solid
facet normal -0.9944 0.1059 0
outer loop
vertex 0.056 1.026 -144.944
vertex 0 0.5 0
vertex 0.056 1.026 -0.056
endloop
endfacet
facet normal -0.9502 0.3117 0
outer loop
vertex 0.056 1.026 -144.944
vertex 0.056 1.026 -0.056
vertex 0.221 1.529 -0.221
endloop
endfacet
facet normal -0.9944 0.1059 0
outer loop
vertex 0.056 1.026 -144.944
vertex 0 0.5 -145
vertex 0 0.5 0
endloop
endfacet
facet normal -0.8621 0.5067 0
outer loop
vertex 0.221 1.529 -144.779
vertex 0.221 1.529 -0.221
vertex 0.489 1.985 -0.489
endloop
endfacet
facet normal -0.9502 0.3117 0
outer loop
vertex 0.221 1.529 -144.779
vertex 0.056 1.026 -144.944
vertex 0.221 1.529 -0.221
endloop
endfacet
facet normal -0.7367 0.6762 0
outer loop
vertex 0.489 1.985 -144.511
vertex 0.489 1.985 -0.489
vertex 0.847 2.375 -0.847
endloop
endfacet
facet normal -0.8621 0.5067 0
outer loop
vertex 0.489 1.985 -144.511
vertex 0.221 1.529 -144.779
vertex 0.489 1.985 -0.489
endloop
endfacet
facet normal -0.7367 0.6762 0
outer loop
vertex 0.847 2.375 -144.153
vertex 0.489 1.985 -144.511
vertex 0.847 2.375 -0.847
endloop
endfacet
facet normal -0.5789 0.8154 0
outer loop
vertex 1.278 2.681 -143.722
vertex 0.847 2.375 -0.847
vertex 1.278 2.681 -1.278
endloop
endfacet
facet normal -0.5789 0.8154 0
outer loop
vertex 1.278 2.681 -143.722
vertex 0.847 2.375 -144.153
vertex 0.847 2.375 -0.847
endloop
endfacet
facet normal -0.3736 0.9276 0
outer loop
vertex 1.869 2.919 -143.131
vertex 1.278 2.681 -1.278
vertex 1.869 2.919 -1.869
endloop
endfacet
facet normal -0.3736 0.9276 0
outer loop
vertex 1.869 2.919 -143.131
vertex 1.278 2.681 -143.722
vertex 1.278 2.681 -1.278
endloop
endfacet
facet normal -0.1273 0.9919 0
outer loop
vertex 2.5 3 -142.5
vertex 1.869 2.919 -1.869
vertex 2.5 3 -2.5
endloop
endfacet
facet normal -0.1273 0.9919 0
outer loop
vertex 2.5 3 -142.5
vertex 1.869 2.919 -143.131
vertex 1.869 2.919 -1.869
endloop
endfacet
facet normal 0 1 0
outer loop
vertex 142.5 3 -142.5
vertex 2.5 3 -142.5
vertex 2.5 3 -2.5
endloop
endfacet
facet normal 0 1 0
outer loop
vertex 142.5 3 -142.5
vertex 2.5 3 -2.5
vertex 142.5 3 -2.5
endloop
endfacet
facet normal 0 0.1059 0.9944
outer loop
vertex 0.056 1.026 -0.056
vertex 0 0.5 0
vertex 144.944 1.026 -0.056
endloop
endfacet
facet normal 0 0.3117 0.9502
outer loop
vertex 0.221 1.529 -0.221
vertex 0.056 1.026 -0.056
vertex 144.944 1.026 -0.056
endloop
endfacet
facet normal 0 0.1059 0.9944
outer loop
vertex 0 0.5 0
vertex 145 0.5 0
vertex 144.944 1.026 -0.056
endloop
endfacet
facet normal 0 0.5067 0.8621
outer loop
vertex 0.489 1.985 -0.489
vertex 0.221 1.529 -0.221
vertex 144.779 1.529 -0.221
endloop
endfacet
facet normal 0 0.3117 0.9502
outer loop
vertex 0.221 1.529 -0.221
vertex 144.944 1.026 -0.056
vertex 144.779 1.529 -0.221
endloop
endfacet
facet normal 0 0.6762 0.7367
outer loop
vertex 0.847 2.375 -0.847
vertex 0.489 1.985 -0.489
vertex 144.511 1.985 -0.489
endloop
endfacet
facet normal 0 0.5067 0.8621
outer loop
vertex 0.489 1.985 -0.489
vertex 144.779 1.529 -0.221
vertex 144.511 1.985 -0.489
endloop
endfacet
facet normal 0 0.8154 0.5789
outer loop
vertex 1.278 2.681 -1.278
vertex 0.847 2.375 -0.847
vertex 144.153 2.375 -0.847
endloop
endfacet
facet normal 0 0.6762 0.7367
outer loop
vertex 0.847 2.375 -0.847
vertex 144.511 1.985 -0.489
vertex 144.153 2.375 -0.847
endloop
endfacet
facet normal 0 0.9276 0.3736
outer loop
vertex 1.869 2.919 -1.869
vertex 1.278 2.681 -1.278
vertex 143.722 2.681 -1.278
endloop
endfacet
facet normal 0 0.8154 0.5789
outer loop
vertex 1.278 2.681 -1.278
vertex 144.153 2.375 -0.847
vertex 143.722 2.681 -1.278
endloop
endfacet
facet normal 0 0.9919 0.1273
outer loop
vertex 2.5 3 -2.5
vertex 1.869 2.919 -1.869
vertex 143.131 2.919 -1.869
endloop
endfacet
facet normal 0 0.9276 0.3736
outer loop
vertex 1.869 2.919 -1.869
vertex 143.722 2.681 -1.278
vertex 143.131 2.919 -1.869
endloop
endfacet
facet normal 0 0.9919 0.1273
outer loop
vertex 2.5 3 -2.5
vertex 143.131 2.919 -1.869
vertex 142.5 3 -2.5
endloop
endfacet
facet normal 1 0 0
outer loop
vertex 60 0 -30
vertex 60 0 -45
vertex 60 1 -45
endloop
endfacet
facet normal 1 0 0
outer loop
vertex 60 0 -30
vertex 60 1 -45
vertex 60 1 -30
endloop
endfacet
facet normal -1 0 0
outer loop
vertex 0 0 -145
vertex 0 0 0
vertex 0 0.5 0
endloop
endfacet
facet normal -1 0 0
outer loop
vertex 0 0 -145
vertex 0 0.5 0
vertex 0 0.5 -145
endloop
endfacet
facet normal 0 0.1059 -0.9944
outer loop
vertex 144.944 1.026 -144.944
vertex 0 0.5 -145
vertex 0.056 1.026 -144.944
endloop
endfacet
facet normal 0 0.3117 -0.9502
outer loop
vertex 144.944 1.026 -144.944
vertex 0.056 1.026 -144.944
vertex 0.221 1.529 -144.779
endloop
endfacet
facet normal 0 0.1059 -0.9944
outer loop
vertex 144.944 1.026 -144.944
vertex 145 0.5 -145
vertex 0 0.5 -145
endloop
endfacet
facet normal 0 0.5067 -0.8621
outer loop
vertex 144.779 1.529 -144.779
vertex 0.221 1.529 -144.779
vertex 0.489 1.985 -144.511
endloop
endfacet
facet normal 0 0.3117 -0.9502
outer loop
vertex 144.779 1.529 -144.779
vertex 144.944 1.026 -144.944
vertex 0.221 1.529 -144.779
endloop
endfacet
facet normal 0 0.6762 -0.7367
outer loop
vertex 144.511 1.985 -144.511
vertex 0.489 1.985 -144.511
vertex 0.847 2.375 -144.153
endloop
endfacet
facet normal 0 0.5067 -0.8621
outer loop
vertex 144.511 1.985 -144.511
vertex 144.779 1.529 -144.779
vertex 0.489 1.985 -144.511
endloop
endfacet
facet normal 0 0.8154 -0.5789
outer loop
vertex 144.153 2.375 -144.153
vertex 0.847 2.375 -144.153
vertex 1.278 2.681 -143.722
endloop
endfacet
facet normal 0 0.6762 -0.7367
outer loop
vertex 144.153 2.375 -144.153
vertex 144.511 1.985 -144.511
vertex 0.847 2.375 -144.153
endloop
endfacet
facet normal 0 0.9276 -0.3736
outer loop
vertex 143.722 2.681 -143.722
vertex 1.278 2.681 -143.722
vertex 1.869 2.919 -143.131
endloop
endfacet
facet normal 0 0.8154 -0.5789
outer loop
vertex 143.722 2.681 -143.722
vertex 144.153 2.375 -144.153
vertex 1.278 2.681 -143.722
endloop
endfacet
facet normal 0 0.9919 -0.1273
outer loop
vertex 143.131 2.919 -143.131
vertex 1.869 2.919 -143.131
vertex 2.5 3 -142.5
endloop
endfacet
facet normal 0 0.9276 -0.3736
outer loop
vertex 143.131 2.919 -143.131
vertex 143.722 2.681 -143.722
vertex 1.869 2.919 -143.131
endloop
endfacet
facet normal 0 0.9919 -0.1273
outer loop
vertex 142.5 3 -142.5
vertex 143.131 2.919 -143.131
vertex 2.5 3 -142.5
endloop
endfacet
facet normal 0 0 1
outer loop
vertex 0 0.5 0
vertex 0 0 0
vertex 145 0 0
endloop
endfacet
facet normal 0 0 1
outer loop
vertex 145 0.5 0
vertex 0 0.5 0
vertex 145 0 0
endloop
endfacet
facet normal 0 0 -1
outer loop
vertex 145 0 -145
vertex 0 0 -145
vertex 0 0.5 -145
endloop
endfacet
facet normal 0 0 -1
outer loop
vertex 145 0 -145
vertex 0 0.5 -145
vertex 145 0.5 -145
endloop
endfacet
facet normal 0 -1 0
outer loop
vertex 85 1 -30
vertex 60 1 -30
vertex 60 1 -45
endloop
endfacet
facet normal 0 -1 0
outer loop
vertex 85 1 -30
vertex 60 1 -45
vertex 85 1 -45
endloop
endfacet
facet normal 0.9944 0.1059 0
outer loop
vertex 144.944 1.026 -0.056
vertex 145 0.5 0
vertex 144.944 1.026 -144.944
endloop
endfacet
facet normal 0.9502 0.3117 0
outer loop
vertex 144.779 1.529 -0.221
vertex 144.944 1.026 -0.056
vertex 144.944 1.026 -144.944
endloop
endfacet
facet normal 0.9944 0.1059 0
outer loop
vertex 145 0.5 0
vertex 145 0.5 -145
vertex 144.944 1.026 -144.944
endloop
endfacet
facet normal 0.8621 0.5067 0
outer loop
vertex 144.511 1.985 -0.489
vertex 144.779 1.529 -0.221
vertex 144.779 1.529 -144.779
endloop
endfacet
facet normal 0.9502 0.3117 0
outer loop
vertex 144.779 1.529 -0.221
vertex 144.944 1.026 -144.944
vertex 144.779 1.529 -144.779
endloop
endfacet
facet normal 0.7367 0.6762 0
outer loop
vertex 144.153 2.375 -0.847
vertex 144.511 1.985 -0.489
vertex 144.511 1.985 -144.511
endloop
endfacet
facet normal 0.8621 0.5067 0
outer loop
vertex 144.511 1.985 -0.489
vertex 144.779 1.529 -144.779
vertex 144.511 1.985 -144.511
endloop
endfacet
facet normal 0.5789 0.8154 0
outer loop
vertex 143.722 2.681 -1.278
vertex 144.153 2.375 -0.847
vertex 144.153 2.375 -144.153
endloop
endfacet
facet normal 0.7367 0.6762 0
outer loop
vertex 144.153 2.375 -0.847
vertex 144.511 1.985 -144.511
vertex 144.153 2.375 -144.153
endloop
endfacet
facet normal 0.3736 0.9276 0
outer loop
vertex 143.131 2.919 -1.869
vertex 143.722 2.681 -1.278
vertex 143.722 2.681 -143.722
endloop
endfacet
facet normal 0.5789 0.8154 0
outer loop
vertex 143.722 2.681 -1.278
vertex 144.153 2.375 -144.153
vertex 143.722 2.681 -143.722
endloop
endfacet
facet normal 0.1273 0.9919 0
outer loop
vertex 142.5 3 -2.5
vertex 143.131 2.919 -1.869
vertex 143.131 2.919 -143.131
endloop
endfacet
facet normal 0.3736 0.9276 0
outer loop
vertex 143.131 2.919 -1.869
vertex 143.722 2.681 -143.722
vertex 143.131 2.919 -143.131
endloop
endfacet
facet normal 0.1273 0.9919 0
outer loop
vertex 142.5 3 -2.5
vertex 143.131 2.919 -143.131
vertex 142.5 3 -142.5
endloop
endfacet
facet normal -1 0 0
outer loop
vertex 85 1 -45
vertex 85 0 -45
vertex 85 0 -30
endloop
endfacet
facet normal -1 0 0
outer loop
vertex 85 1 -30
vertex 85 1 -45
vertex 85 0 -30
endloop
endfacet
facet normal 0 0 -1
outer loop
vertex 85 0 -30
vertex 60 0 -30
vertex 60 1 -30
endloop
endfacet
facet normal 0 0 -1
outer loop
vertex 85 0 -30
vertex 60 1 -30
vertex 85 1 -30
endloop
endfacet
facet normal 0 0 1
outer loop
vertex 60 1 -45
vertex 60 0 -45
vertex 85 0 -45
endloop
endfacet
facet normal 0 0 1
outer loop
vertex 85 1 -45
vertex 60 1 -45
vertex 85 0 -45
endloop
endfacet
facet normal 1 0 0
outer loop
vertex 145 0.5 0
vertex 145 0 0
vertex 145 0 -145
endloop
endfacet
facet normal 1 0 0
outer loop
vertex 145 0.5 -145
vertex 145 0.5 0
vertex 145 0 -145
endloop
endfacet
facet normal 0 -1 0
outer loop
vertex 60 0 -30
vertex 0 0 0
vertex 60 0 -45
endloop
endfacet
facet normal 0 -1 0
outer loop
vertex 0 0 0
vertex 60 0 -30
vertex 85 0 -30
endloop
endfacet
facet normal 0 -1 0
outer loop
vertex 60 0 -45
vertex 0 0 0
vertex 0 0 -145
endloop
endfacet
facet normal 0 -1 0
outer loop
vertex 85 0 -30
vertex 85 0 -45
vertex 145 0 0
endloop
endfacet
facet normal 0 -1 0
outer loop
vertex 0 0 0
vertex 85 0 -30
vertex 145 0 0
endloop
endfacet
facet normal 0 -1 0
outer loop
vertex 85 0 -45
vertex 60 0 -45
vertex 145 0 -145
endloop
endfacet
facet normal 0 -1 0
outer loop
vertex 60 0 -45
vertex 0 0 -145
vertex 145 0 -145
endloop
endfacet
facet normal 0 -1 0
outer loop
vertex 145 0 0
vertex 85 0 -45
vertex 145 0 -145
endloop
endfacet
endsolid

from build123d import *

# Parameters (mm, degrees)
SKETCH1_W           = 145
SKETCH1_H           = 145
BOSS_EXTRUDE1_DEPTH = 3
FILLET1_R           = 2.5
SKETCH2_W           = 25
SKETCH2_H           = 15
CUT_EXTRUDE1_DEPTH  = 1


with BuildPart() as part:
    # Sketch1 → Boss-Extrude1 (new body)
    with BuildSketch(Plane(origin=(0, 0, 0), x_dir=(1, 0, 0), z_dir=(0, 1, 0))):
        with Locations((72.5, 72.5)):
            Rectangle(SKETCH1_W, SKETCH1_H)
    extrude(amount=BOSS_EXTRUDE1_DEPTH)

    # Fillet1
    fillet1_edges = [part.edges().sort_by_distance(p)[0] for p in [
        (145, 3, -72.5),
        (72.5, 3, -145),
        (0, 3, -72.5),
        (72.5, 3, 0),
    ]]
    fillet(fillet1_edges, radius=FILLET1_R)

    # Sketch2 → Cut-Extrude1 (cut)
    with BuildSketch(Plane.XZ):
        with Locations((72.5, -37.5)):
            Rectangle(SKETCH2_W, SKETCH2_H)
    extrude(amount=-CUT_EXTRUDE1_DEPTH, mode=Mode.SUBTRACT)


solid = part.part
